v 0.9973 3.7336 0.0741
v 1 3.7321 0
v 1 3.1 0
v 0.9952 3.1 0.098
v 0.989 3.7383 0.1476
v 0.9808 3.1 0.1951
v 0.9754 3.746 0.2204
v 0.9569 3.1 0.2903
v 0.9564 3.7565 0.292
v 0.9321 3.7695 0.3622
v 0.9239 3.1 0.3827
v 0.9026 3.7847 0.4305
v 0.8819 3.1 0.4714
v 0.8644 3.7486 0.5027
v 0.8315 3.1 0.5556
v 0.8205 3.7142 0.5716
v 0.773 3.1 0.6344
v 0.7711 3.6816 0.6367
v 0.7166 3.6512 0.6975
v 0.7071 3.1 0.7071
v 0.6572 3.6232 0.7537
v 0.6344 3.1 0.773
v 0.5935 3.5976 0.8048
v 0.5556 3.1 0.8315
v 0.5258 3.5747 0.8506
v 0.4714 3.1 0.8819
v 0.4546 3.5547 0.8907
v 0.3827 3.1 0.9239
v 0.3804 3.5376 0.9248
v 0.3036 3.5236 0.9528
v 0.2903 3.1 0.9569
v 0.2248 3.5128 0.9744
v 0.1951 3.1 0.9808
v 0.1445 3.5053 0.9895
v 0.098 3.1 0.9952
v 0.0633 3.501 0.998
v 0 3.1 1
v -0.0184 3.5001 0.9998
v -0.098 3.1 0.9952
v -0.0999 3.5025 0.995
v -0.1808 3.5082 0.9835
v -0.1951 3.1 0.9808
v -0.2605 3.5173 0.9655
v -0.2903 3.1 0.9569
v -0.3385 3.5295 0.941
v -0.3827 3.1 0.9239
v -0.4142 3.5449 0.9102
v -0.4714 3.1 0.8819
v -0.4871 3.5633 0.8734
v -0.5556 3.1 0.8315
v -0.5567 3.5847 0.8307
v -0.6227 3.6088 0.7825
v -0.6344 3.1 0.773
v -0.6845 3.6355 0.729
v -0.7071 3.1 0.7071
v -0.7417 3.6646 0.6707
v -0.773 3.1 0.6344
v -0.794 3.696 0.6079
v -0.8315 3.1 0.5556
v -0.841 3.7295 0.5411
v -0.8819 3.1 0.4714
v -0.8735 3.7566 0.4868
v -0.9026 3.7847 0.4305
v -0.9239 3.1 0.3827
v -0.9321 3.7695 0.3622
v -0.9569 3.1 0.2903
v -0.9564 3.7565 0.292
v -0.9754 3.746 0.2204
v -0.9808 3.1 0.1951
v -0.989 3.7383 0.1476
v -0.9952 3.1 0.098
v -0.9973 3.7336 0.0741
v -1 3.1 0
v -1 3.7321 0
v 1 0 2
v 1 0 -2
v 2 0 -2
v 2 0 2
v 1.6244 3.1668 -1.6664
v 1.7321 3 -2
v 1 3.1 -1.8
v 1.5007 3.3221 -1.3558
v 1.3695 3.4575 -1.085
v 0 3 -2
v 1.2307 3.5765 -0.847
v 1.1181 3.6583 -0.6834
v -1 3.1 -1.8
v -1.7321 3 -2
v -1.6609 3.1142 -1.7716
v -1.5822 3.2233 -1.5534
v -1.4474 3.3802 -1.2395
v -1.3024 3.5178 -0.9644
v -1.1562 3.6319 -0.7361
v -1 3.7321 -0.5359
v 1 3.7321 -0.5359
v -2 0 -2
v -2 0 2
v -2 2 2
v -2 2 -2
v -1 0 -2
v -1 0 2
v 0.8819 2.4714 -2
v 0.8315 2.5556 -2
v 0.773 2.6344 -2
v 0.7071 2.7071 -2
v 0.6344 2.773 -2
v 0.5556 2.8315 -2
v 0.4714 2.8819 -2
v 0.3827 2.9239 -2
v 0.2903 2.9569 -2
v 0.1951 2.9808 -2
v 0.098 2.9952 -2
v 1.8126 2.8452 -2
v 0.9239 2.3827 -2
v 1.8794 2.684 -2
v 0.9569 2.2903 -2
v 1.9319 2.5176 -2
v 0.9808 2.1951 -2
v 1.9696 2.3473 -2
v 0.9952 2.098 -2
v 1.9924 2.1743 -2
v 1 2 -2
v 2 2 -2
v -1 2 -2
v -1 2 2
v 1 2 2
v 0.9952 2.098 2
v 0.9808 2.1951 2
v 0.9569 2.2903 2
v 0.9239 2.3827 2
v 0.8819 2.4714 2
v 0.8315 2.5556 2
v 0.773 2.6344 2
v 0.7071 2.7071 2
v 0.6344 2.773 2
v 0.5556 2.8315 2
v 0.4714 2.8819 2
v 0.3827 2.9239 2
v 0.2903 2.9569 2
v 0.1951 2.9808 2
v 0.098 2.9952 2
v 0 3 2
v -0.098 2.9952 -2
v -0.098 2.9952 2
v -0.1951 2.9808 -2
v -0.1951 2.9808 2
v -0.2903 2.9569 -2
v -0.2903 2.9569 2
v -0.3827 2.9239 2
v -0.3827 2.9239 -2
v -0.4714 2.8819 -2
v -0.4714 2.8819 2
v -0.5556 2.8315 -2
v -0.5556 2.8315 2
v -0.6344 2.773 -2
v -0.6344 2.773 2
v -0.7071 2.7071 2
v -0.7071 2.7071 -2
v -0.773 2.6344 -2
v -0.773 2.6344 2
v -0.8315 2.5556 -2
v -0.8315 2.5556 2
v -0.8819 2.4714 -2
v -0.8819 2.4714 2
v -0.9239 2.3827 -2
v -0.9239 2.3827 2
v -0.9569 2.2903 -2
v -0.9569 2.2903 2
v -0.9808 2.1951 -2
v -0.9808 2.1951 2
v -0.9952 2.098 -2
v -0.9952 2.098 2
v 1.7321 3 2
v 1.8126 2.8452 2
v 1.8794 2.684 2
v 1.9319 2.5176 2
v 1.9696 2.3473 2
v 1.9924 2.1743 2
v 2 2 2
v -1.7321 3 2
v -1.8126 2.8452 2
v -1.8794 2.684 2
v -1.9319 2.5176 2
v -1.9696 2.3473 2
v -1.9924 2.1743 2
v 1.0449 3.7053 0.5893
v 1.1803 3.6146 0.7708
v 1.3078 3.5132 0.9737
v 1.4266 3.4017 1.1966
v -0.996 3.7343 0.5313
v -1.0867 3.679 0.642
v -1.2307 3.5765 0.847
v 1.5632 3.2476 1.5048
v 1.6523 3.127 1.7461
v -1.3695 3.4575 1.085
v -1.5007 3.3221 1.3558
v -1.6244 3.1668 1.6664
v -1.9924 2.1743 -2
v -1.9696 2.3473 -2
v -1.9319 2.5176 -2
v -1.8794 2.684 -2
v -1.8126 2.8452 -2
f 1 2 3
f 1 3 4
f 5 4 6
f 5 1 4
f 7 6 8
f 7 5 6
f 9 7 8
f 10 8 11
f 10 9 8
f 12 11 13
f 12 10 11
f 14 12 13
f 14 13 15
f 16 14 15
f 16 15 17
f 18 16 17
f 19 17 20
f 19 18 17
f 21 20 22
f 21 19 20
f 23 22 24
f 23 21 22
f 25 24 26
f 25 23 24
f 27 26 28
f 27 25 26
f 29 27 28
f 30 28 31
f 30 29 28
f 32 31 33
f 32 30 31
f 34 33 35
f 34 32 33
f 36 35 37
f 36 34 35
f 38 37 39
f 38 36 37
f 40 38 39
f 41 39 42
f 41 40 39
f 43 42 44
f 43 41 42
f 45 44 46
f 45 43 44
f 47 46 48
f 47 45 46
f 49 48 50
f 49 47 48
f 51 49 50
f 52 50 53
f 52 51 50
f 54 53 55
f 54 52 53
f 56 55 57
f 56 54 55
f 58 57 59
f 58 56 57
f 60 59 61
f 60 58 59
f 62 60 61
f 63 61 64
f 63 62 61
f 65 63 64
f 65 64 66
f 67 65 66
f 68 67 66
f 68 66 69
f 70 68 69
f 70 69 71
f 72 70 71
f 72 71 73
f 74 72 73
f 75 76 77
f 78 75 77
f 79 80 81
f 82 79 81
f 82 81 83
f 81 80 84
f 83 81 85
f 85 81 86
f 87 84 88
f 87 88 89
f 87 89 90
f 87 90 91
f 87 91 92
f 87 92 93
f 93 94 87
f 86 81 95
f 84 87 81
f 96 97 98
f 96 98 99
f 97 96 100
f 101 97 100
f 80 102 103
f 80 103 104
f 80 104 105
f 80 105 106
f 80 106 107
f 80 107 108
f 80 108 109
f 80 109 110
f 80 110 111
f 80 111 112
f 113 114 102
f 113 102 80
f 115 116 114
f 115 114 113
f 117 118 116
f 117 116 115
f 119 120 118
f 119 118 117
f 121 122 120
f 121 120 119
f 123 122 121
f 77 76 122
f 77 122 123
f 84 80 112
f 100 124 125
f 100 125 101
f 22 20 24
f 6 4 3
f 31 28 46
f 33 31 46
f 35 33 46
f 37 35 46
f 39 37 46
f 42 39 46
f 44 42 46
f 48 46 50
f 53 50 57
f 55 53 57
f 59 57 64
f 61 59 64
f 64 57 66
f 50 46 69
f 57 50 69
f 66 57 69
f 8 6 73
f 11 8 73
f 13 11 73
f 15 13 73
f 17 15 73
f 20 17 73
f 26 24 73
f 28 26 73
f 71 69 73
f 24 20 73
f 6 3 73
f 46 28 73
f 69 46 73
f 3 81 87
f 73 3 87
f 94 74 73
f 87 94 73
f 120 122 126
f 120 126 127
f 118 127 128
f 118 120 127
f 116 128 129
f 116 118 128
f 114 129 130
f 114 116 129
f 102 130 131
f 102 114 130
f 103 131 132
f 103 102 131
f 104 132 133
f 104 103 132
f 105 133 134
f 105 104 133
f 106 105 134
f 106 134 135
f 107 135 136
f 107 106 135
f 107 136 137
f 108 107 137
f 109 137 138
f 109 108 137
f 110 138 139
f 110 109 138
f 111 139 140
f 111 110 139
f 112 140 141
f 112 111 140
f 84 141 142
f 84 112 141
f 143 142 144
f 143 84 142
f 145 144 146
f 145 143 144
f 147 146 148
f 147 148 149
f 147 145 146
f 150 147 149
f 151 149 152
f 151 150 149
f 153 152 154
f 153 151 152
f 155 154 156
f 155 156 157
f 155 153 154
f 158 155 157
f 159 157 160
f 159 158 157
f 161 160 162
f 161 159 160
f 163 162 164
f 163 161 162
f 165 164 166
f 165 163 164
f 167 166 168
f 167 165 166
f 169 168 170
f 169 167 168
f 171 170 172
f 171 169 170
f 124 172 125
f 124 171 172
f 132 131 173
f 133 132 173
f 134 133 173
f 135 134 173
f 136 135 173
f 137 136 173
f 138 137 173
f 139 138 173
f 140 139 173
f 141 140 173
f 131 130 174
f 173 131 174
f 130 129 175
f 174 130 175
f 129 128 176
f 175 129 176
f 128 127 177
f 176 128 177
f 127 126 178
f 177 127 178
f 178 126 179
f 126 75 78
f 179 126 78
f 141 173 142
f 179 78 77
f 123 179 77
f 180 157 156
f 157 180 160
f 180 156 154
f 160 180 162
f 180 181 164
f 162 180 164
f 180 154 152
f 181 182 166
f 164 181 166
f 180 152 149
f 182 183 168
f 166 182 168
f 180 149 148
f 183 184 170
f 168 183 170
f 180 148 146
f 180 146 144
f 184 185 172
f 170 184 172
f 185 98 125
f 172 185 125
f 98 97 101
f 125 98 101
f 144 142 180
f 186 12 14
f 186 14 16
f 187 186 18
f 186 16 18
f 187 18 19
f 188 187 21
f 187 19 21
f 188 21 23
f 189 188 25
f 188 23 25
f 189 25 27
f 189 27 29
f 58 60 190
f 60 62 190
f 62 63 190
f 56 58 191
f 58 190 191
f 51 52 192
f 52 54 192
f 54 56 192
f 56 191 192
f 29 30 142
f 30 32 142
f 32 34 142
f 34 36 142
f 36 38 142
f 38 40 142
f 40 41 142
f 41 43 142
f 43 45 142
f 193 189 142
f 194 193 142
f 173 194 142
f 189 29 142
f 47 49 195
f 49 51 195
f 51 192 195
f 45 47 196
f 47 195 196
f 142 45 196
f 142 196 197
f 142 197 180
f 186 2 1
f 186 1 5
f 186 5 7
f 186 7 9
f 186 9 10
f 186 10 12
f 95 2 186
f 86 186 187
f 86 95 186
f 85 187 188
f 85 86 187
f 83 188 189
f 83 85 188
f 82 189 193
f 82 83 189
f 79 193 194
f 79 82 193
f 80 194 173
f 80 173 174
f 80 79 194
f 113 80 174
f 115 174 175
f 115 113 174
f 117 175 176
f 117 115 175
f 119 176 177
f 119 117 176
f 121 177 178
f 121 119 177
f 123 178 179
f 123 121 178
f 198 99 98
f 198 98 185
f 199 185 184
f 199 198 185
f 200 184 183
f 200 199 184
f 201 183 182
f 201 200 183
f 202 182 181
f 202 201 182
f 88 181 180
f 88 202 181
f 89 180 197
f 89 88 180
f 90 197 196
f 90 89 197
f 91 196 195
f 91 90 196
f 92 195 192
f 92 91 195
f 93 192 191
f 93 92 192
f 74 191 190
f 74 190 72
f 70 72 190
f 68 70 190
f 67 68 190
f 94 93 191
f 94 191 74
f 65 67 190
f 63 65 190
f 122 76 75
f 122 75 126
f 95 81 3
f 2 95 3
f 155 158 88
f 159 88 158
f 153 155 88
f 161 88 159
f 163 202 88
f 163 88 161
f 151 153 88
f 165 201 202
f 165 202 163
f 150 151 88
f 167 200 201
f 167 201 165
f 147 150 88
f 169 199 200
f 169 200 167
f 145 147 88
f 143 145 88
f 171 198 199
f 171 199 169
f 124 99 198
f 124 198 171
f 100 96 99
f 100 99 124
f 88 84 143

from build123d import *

# Parameters (mm, degrees)
SKETCH1_W           = 4
SKETCH1_H           = 4
BOSS_EXTRUDE1_DEPTH = 4
CUT_EXTRUDE1_DEPTH  = 10
CUT_EXTRUDE2_DEPTH  = 10
CUT_EXTRUDE5_DEPTH  = 0.9


with BuildPart() as part:
    # Sketch1 → Boss-Extrude1 (new body)
    with BuildSketch(Plane(origin=(0, 0, 0), x_dir=(1, 0, 0), z_dir=(0, 1, 0))):
        Rectangle(SKETCH1_W, SKETCH1_H)
    extrude(amount=BOSS_EXTRUDE1_DEPTH)

    # Sketch4 → Cut-Extrude1 (cut)
    with BuildSketch(Plane.ZY.offset(2)):
        Polygon((-2, 4), (-2, 3), (0, 4), align=None)
        Polygon((2, 4), (0, 4), (2, 3), align=None)
    extrude(amount=-CUT_EXTRUDE1_DEPTH, mode=Mode.SUBTRACT)

    # Sketch5 → Cut-Extrude2 (cut)
    with BuildSketch(Plane.XY.offset(2)):
        with BuildLine():
            Line((2, 4), (0, 4))
            ThreePointArc((0, 4), (1.414213562, 3.414213562), (2, 2))
            Line((2, 2), (2, 4))
        make_face()
        with BuildLine():
            Line((0, 4), (-2, 4))
            Line((-2, 4), (-2, 2))
            ThreePointArc((-2, 2), (-1.414213562, 3.414213562), (0, 4))
        make_face()
        with BuildLine():
            ThreePointArc((1, 2), (0, 3), (-1, 2))
            Line((-1, 2), (-1, 0))
            Line((-1, 0), (1, 0))
            Line((1, 0), (1, 2))
        make_face()
    extrude(amount=-CUT_EXTRUDE2_DEPTH, mode=Mode.SUBTRACT)

    # Sketch6 → Cut-Extrude5 (cut)
    with BuildSketch(Plane(origin=(0, 4, 0), x_dir=(1, 0, 0), z_dir=(0, 1, 0))):
        with BuildLine():
            Line((-1, 0), (-1, 2))
            ThreePointArc((-1, 2), (0, 3), (1, 2))
            Line((1, 2), (1, 0))
            ThreePointArc((1, 0), (0, -1), (-1, 0))
        make_face()
    extrude(amount=-CUT_EXTRUDE5_DEPTH, mode=Mode.SUBTRACT)


solid = part.part
